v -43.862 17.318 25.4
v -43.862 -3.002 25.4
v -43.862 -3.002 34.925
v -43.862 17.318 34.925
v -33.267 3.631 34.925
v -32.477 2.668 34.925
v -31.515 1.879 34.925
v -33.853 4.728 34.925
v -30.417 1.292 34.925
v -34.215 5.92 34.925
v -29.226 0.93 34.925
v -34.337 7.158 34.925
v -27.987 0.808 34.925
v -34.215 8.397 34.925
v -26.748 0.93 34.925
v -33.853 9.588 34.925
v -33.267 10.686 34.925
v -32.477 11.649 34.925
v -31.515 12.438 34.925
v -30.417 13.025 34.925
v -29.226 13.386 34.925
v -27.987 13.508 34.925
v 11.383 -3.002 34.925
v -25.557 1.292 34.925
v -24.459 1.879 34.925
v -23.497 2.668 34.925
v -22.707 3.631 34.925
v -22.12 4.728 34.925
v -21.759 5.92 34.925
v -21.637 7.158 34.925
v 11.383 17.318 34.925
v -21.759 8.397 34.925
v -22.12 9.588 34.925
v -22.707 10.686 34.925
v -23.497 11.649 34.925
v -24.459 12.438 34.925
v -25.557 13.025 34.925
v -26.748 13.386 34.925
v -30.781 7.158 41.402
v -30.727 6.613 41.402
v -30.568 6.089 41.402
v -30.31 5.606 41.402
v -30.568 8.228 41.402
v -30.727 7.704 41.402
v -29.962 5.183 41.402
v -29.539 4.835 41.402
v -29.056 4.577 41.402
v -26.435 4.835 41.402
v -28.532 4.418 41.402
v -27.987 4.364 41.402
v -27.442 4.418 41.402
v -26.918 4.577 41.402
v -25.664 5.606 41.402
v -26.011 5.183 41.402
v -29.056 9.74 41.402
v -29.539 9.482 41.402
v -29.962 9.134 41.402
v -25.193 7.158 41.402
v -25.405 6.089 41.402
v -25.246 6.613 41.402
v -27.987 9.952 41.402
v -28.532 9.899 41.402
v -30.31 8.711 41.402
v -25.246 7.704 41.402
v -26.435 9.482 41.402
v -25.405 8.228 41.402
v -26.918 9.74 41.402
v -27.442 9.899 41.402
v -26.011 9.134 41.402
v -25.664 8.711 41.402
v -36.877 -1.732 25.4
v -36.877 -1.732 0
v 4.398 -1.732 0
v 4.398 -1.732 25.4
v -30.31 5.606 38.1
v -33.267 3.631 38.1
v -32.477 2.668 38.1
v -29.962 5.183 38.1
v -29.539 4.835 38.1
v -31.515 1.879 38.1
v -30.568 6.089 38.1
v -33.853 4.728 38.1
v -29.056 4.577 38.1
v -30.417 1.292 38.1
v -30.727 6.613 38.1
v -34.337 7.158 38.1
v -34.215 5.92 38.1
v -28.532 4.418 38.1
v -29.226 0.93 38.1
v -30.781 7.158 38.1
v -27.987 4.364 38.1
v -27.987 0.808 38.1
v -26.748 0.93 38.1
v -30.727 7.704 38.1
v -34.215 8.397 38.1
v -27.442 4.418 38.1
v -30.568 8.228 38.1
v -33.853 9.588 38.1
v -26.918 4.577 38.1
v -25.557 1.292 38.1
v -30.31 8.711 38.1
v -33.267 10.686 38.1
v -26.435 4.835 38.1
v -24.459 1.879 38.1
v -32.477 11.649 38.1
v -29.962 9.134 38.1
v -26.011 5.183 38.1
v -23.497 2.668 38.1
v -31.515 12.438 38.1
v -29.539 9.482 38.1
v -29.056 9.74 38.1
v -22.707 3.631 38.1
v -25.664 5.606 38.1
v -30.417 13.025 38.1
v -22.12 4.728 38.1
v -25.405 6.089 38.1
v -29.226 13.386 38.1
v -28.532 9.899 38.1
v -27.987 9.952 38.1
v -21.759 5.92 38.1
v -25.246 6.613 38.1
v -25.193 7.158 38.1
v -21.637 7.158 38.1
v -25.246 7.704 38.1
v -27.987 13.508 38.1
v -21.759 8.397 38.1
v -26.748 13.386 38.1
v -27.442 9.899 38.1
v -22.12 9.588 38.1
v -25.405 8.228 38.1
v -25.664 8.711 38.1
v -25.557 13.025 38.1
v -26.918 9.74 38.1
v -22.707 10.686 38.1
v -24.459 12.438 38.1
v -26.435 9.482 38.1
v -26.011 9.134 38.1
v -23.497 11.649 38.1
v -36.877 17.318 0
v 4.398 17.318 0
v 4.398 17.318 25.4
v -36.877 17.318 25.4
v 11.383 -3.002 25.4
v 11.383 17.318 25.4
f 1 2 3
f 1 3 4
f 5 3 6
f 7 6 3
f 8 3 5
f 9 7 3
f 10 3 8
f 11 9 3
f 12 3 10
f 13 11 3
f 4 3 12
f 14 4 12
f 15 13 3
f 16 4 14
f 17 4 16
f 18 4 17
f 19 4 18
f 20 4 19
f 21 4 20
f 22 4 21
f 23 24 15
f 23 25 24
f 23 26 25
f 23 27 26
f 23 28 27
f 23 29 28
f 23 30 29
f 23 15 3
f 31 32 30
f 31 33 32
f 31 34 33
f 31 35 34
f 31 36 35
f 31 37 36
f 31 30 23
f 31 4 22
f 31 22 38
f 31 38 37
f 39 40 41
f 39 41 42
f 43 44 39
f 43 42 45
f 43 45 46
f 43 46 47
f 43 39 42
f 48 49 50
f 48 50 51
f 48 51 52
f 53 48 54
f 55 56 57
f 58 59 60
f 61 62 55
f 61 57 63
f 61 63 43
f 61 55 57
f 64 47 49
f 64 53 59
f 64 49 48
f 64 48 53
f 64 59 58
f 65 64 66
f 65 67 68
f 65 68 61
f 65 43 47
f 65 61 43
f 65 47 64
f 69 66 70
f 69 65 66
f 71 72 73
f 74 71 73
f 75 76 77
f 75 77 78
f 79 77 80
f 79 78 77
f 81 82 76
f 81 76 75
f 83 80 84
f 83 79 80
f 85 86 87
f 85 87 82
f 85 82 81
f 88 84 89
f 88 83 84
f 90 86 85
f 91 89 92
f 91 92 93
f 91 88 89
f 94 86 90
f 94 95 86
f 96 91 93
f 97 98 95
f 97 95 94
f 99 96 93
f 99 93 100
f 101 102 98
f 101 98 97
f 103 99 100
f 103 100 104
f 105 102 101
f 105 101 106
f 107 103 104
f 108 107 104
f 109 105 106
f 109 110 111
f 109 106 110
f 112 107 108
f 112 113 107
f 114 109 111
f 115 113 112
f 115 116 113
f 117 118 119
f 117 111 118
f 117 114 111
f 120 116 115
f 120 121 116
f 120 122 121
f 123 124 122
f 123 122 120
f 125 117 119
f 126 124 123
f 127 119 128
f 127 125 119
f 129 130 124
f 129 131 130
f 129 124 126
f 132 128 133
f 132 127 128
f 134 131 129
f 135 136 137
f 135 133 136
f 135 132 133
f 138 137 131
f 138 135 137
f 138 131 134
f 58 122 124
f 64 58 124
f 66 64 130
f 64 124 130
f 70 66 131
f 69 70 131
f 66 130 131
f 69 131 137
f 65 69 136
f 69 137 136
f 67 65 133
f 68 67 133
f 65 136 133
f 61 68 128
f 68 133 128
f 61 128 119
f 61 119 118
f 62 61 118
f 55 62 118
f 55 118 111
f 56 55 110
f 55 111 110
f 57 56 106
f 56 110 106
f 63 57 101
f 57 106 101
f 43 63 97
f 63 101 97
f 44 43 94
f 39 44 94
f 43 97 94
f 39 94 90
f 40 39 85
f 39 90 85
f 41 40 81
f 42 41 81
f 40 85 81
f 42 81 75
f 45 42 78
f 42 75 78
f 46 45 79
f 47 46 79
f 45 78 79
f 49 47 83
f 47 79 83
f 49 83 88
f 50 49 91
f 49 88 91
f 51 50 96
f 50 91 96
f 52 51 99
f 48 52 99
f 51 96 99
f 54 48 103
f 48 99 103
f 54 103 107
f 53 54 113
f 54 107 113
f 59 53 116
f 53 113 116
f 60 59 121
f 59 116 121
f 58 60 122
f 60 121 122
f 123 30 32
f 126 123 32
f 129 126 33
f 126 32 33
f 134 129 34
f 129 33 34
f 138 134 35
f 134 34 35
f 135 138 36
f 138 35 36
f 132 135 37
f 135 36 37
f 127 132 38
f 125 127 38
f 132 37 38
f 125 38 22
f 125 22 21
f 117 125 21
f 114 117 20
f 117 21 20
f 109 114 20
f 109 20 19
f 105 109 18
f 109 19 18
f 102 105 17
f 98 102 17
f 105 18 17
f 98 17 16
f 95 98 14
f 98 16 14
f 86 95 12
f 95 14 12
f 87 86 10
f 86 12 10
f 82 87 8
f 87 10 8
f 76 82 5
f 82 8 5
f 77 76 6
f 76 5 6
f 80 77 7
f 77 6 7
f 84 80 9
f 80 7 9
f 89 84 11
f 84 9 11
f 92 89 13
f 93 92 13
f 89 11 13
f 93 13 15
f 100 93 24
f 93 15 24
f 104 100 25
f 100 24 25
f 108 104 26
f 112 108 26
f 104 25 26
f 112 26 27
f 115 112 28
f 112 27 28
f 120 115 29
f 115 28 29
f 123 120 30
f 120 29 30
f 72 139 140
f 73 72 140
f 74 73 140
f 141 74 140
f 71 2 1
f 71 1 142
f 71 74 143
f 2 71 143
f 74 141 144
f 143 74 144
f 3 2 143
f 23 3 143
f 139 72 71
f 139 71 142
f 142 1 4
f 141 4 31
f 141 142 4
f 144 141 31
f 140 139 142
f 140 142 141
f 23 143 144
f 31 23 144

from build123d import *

# Parameters (mm, degrees)
F0_W     = 41.275
F0_H     = 19.05
F1_DEPTH = 25.4
F2_W     = 55.245
F2_H     = 20.32
F3_DEPTH = 9.525
F4_R     = 6.35
F5_DEPTH = 3.175
F6_R     = 2.794
F7_DEPTH = 3.302


with BuildPart() as f1:
    # F0 (on Top) → F1 (new body)
    with BuildSketch(Plane.XY):
        with Locations((-16.2392864004, 7.7934292579)):
            Rectangle(F0_W, F0_H)
    extrude(amount=F1_DEPTH)

    # F2 (on face) → F3 (join)
    with BuildSketch(Plane.XY.offset(25.4)):
        with Locations((-16.2392864004, 7.1584292579)):
            Rectangle(F2_W, F2_H)
    extrude(amount=F3_DEPTH)

    # F4 (on face) → F5 (join)
    with BuildSketch(Plane.XY.offset(34.925)):
        with Locations((-27.9867864004, 7.1584292579)):
            Circle(F4_R)
    extrude(amount=F5_DEPTH)

    # F6 (on face) → F7 (join)
    with BuildSketch(Plane.XY.offset(38.1)):
        with Locations((-27.9867864004, 7.1584292579)):
            Circle(F6_R)
    extrude(amount=F7_DEPTH)


solid = f1.part
